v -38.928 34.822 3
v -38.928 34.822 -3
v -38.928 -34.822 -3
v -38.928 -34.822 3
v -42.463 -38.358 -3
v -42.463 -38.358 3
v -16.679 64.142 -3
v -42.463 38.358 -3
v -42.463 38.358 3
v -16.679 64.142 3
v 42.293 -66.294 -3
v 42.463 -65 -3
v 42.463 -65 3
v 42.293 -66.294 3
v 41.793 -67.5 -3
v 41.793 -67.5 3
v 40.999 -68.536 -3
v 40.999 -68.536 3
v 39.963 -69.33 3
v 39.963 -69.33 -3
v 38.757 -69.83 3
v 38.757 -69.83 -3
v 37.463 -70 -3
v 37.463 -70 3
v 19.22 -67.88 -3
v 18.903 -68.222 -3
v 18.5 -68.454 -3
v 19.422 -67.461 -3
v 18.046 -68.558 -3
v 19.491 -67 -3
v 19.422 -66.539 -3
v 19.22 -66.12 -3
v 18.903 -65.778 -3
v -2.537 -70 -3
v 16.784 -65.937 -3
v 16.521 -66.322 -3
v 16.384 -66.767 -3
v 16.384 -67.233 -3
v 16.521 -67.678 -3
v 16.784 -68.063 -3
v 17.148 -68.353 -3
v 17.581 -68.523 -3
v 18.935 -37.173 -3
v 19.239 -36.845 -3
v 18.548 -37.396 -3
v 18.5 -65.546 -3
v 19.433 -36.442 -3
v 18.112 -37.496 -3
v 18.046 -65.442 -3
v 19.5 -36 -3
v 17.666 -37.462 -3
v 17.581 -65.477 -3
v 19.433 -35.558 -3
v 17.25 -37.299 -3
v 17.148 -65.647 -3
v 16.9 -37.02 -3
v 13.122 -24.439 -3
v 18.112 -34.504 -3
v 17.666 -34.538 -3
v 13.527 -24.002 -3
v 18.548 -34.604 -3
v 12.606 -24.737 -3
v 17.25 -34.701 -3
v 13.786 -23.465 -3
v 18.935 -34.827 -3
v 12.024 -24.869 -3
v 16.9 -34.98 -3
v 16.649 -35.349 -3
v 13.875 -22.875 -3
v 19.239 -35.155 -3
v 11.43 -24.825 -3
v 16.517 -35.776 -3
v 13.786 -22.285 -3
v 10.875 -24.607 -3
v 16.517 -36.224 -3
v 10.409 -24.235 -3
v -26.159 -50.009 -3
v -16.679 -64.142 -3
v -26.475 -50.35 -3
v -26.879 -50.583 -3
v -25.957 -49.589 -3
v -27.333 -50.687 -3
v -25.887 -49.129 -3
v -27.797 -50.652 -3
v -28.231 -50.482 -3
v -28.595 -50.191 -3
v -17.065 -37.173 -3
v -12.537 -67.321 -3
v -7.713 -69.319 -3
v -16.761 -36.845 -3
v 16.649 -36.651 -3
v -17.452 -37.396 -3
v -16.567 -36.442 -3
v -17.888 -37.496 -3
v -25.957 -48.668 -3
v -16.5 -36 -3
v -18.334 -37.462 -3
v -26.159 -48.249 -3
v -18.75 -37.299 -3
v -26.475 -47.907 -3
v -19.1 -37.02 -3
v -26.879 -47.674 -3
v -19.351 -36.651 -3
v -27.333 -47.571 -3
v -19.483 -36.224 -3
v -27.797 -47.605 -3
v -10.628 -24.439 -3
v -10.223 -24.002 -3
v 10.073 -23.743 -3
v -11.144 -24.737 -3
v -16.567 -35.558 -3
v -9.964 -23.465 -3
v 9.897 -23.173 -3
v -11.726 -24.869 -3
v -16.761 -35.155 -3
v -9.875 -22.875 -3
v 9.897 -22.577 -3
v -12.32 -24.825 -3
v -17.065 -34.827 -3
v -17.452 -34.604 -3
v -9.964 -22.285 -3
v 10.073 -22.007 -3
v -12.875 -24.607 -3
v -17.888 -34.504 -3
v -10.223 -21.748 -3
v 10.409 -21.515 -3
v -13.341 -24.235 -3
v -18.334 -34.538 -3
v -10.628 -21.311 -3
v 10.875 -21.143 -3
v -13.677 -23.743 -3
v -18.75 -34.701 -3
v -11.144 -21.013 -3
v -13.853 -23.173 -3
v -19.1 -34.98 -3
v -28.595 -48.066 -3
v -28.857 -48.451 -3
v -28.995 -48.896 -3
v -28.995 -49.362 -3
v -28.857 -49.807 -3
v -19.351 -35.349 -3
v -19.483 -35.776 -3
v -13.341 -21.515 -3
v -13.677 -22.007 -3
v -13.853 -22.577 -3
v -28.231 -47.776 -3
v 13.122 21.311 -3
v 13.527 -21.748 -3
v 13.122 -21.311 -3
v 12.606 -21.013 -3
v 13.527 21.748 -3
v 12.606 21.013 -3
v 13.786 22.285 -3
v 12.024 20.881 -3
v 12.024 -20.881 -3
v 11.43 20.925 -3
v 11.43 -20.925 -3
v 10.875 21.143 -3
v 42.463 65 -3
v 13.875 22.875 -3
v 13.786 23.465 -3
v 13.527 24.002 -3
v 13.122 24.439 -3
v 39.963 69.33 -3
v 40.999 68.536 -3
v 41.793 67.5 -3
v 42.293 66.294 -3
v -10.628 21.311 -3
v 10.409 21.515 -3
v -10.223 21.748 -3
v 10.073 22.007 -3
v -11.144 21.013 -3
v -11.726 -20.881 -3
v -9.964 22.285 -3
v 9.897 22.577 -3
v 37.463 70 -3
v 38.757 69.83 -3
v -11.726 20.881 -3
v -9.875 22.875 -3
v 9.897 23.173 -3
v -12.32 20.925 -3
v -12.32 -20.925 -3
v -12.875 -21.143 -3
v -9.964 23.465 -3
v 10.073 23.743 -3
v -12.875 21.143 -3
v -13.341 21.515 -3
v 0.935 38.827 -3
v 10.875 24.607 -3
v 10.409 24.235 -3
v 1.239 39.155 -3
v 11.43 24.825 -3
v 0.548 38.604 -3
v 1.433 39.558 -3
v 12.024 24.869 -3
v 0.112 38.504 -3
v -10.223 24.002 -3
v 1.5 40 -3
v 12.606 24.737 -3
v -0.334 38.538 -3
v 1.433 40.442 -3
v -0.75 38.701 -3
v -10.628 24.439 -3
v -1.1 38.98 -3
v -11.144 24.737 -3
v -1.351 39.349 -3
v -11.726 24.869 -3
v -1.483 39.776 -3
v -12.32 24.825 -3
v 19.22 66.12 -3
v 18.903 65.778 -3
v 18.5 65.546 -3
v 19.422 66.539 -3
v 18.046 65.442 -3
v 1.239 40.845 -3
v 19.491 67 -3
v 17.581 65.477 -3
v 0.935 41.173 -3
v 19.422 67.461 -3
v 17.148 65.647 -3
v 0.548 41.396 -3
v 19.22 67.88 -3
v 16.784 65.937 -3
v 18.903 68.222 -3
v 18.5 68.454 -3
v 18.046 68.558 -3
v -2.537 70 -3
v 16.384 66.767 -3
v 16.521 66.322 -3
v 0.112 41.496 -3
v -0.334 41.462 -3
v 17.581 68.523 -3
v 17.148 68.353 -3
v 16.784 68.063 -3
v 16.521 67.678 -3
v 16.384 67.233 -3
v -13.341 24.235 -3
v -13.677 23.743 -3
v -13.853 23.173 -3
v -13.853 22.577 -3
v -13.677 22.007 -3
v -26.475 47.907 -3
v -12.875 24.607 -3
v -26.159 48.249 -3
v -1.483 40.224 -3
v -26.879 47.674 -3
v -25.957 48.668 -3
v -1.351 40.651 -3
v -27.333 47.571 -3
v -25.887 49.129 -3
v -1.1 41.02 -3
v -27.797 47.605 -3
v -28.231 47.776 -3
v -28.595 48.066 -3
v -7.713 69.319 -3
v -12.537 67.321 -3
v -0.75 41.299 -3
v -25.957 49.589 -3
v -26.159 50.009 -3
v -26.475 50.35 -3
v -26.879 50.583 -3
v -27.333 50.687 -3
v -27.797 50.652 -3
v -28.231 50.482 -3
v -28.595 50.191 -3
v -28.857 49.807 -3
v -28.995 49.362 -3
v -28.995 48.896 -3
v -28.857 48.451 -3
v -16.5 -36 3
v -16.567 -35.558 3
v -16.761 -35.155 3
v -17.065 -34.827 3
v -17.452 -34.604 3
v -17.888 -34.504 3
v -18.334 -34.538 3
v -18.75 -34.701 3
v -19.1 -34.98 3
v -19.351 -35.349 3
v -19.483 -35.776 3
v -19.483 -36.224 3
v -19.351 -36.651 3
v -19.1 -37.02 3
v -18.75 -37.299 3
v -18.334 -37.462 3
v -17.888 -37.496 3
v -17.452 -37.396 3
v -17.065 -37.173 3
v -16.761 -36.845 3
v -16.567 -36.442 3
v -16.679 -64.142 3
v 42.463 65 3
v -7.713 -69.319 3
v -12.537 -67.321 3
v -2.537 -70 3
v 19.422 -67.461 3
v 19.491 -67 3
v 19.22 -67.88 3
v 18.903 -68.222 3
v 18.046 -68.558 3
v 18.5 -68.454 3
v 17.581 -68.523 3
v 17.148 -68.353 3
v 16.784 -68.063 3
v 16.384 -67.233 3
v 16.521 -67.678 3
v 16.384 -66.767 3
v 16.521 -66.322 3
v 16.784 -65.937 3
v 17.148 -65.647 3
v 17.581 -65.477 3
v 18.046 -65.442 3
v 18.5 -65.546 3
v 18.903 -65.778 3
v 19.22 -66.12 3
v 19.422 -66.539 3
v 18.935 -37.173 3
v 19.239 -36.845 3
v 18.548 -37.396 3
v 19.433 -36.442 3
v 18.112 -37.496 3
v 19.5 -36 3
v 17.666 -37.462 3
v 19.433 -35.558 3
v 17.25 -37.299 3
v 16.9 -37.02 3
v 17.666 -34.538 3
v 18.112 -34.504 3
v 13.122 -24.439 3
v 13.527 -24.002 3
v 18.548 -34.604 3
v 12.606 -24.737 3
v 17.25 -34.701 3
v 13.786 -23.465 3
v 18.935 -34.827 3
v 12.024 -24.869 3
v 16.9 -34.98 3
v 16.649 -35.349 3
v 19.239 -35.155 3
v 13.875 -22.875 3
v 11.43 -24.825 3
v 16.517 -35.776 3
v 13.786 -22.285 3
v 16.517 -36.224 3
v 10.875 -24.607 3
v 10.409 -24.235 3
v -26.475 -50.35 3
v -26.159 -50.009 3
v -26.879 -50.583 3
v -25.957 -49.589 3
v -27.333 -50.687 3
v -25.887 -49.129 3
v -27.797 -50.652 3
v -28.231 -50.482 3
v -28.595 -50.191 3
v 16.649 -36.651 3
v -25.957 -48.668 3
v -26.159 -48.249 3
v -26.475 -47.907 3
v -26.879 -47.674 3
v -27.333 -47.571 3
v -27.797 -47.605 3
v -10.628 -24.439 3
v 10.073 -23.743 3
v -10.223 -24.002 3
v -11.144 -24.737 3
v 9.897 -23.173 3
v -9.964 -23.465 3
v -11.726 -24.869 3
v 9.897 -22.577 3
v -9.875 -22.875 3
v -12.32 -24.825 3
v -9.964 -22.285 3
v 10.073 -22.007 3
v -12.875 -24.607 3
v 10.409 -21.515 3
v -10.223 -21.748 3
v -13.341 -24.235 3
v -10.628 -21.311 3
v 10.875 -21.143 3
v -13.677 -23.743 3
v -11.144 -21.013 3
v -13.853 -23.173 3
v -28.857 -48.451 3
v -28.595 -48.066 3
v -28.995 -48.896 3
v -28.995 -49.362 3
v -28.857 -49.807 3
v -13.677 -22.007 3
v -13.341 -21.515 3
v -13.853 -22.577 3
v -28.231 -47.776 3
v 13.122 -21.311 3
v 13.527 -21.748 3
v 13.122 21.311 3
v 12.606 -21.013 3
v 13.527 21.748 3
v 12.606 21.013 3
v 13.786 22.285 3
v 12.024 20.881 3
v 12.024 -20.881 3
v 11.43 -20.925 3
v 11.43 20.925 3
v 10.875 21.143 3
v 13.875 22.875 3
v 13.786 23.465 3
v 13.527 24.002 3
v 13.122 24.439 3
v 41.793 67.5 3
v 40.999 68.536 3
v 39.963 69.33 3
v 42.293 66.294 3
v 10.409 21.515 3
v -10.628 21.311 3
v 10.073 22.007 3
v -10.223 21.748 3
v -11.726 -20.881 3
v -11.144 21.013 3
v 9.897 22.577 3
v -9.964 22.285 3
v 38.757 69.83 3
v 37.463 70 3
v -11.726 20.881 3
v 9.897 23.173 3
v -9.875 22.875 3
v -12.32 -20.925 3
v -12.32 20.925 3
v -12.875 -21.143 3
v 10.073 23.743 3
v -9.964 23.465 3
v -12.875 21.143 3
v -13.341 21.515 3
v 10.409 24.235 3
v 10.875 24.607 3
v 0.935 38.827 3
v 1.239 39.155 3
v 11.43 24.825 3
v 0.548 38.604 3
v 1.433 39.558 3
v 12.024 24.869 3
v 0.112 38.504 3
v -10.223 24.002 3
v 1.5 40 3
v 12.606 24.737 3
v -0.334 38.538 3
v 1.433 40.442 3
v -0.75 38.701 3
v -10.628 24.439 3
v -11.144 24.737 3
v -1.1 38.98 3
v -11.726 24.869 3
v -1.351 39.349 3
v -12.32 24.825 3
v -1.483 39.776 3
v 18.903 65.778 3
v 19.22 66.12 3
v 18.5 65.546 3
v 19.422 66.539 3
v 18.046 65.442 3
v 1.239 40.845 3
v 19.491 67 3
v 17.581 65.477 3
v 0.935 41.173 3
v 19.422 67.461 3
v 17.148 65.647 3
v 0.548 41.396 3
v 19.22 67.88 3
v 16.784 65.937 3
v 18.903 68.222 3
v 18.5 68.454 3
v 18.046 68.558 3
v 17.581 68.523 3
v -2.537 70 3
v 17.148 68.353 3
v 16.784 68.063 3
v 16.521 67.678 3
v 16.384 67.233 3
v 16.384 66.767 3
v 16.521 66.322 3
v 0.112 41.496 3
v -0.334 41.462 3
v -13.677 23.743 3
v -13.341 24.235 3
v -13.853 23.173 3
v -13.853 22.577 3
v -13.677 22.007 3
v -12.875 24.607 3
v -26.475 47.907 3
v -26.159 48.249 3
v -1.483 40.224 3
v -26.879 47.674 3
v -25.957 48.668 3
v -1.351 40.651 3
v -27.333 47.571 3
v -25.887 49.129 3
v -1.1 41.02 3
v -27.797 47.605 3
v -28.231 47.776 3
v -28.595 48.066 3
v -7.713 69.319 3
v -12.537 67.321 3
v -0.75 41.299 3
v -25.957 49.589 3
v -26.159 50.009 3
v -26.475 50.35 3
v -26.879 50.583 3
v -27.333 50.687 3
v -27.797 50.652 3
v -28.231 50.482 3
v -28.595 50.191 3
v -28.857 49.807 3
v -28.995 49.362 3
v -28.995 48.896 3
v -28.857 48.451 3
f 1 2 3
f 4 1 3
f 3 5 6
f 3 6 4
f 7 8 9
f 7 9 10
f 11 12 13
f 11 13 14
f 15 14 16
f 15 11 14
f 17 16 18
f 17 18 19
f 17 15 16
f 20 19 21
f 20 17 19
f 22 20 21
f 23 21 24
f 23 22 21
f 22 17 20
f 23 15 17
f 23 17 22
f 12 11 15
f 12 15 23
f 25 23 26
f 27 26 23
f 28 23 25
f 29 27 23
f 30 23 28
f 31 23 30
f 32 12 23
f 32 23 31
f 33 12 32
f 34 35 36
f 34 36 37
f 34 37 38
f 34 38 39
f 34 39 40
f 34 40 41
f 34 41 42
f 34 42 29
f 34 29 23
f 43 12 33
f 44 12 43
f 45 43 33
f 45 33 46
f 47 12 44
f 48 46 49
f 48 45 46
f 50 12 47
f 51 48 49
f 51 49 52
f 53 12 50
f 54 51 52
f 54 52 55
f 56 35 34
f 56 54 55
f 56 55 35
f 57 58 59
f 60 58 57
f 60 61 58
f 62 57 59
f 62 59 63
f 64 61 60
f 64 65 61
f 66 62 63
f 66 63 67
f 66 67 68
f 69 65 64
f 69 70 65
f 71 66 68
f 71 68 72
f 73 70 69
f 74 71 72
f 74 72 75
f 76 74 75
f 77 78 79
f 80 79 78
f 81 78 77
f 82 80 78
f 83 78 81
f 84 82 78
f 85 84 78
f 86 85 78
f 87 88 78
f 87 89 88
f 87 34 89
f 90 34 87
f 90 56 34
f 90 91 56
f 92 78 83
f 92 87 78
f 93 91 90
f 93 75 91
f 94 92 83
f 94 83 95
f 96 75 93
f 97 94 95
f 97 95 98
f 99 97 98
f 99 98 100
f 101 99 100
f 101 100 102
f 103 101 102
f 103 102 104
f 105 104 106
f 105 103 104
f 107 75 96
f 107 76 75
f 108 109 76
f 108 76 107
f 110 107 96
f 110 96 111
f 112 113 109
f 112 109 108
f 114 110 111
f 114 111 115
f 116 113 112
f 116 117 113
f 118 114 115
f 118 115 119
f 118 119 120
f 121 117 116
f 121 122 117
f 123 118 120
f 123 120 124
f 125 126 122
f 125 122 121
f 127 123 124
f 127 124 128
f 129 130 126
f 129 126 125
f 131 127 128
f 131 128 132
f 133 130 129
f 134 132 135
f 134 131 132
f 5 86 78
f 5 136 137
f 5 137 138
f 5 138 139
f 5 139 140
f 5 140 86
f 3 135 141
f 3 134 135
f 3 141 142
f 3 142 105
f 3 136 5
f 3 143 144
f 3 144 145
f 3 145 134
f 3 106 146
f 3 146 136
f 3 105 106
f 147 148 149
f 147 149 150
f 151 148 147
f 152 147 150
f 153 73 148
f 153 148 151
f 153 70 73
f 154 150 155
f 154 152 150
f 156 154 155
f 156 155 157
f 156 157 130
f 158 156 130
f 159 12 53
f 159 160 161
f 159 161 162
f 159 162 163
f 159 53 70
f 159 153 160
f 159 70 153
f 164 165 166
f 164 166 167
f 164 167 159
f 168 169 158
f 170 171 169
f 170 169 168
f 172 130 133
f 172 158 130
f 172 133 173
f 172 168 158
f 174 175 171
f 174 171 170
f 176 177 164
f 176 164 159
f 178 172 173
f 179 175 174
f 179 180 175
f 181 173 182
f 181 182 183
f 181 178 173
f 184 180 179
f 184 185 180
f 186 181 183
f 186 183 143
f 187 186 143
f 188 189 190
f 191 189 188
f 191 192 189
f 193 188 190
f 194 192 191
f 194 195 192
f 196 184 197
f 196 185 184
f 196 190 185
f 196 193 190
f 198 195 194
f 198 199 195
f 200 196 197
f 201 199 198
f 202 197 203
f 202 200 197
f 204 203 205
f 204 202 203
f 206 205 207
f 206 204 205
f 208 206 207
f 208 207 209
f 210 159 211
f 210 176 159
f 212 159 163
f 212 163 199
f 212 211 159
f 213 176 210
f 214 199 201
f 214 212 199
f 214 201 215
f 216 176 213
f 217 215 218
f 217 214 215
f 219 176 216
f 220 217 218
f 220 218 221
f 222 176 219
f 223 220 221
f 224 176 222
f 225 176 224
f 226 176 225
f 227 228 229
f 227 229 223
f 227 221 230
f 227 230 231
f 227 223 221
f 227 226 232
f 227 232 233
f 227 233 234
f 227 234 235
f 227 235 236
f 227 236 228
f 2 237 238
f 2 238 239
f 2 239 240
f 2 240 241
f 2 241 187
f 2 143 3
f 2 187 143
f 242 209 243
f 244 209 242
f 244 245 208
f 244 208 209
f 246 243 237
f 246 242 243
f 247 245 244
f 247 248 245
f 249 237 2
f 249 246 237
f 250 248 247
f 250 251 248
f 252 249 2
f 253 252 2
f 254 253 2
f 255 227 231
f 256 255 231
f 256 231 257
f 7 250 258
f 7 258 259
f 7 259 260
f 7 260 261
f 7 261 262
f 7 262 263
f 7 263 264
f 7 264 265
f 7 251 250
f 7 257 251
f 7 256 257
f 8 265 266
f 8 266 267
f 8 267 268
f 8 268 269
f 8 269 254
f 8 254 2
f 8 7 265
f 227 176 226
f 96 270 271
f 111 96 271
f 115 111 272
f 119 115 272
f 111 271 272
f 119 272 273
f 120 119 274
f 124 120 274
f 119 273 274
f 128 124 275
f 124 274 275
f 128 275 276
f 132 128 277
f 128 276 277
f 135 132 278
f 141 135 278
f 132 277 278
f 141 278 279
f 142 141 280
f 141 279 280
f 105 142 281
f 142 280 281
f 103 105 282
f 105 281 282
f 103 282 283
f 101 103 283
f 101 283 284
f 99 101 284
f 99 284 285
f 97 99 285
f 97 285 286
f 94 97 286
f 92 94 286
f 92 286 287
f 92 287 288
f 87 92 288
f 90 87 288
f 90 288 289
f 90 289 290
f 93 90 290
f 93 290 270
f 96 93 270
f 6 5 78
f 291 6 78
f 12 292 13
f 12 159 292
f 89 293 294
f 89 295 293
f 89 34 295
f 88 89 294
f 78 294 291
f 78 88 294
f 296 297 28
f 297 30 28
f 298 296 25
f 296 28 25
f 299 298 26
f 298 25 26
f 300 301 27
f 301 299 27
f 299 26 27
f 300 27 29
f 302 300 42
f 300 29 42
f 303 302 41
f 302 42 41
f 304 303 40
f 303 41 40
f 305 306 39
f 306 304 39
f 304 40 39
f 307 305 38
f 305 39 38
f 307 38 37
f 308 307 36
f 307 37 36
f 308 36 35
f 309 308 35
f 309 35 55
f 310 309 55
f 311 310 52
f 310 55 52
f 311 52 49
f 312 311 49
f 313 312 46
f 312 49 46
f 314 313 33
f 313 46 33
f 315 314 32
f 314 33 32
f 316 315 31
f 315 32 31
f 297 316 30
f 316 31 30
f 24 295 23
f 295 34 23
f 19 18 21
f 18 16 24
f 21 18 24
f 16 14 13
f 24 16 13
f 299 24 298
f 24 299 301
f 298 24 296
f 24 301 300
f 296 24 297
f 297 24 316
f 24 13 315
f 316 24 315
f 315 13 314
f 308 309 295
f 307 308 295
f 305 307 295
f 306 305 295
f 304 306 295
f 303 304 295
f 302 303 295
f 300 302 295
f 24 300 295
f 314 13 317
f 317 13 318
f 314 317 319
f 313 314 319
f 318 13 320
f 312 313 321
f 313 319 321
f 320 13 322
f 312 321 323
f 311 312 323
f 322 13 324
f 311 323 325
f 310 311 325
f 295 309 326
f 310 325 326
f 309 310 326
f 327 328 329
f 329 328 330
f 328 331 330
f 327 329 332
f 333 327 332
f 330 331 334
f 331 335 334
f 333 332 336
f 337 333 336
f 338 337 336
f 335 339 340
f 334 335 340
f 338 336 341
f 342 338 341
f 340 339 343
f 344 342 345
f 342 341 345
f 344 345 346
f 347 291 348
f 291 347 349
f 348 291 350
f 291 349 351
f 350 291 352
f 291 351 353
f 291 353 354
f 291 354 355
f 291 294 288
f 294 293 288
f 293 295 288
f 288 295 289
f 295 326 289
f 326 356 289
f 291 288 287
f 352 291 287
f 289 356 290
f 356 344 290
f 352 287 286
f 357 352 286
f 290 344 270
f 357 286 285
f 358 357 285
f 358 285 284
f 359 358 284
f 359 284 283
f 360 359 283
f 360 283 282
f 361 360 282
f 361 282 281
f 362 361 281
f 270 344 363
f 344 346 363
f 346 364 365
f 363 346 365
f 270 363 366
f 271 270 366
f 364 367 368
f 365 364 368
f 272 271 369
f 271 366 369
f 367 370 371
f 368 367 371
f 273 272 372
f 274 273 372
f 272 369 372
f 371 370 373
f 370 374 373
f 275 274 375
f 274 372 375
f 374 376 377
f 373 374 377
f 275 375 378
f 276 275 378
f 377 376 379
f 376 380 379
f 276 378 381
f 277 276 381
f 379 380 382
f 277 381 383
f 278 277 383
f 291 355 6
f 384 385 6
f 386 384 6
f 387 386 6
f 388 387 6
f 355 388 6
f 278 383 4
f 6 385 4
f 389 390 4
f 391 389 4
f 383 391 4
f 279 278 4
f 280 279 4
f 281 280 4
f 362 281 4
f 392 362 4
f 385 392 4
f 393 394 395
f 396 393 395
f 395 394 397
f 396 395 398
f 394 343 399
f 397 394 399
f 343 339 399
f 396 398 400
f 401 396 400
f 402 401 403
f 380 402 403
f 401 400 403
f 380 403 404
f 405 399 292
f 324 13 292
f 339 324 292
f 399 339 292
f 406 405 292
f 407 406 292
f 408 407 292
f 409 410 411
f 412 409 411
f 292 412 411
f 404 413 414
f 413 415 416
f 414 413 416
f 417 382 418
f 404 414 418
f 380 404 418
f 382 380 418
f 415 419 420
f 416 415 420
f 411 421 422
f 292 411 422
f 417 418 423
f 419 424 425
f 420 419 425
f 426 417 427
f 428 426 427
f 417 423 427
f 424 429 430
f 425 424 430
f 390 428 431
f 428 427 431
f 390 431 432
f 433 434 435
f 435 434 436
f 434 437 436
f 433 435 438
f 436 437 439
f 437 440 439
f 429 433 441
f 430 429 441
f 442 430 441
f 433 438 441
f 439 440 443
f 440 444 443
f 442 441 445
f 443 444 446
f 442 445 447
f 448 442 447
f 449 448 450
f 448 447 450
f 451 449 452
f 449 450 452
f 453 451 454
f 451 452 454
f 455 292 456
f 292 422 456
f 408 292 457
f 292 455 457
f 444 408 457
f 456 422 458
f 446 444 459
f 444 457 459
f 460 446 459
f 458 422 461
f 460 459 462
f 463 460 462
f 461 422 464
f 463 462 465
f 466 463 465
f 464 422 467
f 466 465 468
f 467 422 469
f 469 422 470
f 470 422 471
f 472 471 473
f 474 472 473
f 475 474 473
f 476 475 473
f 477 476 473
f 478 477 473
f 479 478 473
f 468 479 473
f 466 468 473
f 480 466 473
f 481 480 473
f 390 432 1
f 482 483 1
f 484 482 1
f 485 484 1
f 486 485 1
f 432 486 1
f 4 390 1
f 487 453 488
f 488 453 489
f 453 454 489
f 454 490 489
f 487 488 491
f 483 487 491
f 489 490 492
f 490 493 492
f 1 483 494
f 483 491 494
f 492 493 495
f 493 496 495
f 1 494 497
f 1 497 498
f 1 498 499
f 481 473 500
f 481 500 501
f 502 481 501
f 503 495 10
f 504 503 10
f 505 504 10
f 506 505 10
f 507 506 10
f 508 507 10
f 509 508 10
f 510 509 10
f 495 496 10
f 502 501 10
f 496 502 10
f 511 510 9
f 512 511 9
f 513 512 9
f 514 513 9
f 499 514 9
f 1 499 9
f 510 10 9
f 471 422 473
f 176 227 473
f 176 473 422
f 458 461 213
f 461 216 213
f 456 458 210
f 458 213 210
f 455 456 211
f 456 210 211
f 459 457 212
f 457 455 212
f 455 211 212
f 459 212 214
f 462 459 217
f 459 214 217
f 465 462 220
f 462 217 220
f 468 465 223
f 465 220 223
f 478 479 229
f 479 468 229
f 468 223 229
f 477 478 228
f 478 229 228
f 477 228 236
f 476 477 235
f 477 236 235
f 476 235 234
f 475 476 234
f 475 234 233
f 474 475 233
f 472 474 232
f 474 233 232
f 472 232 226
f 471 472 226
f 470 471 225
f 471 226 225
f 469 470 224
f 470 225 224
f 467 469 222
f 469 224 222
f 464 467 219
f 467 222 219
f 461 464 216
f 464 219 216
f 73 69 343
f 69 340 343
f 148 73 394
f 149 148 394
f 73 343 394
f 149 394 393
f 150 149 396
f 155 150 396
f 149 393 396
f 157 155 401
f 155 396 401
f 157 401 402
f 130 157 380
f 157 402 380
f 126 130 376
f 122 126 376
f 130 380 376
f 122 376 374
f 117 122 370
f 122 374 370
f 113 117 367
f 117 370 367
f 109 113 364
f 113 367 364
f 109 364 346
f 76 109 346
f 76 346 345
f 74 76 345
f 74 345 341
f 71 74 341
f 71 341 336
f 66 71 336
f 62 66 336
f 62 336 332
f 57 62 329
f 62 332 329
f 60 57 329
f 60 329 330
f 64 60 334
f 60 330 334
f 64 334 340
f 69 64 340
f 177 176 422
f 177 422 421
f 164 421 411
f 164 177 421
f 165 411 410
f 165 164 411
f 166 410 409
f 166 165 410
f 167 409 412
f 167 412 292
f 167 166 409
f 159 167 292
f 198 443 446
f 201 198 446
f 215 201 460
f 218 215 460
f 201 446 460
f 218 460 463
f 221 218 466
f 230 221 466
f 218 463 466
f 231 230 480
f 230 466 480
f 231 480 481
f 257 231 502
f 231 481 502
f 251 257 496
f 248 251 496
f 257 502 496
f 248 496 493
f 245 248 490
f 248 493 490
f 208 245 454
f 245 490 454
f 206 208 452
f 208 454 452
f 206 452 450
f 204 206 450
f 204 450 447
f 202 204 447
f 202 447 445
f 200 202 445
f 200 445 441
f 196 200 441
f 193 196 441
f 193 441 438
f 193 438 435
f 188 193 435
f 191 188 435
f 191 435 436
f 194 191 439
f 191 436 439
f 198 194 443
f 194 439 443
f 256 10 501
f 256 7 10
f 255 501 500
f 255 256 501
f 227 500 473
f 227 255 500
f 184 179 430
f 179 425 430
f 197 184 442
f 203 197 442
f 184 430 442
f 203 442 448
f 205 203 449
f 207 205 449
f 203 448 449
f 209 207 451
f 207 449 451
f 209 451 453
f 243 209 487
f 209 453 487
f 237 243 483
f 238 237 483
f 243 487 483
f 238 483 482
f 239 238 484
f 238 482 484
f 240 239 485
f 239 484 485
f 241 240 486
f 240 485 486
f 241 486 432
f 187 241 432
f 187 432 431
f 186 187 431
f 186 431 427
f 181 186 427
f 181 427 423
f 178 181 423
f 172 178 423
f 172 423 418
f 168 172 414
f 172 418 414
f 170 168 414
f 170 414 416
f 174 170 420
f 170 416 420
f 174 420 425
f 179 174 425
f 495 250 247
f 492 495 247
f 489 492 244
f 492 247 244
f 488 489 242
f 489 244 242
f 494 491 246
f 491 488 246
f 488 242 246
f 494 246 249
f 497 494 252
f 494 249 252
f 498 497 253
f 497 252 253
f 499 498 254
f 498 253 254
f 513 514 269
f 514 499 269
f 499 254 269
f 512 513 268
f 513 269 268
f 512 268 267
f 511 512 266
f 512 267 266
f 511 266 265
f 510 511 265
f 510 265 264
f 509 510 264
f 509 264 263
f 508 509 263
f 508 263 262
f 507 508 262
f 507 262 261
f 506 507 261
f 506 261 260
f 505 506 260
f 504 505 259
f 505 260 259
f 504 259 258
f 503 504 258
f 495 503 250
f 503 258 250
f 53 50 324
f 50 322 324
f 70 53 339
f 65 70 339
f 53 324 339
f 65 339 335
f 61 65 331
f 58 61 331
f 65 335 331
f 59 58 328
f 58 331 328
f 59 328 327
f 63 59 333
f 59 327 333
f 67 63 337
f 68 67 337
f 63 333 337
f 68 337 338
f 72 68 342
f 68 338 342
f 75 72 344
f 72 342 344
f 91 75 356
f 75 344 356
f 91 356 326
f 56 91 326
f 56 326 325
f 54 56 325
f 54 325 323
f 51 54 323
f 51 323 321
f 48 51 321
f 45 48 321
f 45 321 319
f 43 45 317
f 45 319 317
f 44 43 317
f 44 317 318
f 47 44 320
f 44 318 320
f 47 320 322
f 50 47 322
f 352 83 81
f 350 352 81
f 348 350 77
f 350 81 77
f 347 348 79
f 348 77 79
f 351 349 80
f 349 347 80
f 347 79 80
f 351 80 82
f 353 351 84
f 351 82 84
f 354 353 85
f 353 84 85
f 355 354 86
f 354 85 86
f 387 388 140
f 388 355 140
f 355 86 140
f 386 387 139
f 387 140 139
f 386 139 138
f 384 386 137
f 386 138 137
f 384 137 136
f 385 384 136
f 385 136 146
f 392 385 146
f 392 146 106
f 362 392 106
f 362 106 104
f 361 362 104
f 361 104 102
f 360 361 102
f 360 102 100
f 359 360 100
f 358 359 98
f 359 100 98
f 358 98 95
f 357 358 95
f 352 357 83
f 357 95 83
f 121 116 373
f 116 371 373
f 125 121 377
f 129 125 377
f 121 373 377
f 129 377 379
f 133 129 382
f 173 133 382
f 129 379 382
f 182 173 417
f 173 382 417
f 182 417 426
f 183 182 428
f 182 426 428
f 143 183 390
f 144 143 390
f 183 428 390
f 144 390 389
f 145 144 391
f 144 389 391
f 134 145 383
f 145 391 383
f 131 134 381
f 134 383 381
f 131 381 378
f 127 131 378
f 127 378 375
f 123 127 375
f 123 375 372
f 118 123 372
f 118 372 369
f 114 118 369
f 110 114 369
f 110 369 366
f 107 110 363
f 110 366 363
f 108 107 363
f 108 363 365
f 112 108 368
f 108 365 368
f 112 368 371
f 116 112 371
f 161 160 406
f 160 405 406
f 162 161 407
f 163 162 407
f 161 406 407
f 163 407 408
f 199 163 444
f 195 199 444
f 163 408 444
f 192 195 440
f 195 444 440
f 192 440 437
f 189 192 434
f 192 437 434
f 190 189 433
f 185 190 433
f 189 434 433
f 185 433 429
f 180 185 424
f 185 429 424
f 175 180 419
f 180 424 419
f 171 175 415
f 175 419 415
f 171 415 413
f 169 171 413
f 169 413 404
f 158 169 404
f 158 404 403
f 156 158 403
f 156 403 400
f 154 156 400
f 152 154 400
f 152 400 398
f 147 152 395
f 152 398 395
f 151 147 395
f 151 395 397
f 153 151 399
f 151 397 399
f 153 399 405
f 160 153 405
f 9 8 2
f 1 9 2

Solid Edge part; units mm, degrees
sketch "Sketch1" plane through (0, 0, 0) normal (0, 0, 1) x (1, 0, 0)
  line L0 (-2.5368, 70) -> (42.4632, 70)
  line L1 (42.4632, 70) -> (42.4632, -70)
  line L2 (-2.5368, -70) -> (42.4632, -70)
  arc A0 (-16.6789, -64.1421) -> (-2.5368, -70) centre (-2.5368, -50) ccw
  line L3 (-42.4632, -38.3579) -> (-16.6789, -64.1421)
  line L4 (-42.4632, -38.3579) -> (-38.9277, -34.8223)
  line L5 (-38.9277, 34.8223) -> (-38.9277, -34.8223)
  line L6 (-42.4632, 38.3579) -> (-38.9277, 34.8223)
  line L7 (-42.4632, 38.3579) -> (-16.6789, 64.1421)
  arc A1 (-16.6789, 64.1421) -> (-2.5368, 70) centre (-2.5368, 50) cw
  circle A2 centre (-27.4497, 49.1287) radius 1.5625
  circle A3 centre (17.9289, 67) radius 1.5625
  circle A4 centre (-27.4497, -49.1287) radius 1.5625
  circle A5 centre (17.9289, -67) radius 1.5625
extrude "Protrusion1" add sketch "Sketch1" along normal mid plane 6
fillet "Round_1" radius 5 2 edges at (42.4632, -70, 0) (42.4632, 70, 0)
sketch "Sketch2" plane through (0, 0, 3) normal (0, 0, 1) x (1, 0, 0)
  circle A0 centre (18, -36) radius 1.5
  circle A1 centre (-18, -36) radius 1.5
  circle A2 centre (0, 40) radius 1.5
  circle A3 centre (11.875, 22.875) radius 2
  circle A4 centre (11.875, -22.875) radius 2
  circle A5 centre (-11.875, -22.875) radius 2
  circle A6 centre (-11.875, 22.875) radius 2
extrude "ExtrudedCutout_1" cut sketch "Sketch2" against normal blind 7
